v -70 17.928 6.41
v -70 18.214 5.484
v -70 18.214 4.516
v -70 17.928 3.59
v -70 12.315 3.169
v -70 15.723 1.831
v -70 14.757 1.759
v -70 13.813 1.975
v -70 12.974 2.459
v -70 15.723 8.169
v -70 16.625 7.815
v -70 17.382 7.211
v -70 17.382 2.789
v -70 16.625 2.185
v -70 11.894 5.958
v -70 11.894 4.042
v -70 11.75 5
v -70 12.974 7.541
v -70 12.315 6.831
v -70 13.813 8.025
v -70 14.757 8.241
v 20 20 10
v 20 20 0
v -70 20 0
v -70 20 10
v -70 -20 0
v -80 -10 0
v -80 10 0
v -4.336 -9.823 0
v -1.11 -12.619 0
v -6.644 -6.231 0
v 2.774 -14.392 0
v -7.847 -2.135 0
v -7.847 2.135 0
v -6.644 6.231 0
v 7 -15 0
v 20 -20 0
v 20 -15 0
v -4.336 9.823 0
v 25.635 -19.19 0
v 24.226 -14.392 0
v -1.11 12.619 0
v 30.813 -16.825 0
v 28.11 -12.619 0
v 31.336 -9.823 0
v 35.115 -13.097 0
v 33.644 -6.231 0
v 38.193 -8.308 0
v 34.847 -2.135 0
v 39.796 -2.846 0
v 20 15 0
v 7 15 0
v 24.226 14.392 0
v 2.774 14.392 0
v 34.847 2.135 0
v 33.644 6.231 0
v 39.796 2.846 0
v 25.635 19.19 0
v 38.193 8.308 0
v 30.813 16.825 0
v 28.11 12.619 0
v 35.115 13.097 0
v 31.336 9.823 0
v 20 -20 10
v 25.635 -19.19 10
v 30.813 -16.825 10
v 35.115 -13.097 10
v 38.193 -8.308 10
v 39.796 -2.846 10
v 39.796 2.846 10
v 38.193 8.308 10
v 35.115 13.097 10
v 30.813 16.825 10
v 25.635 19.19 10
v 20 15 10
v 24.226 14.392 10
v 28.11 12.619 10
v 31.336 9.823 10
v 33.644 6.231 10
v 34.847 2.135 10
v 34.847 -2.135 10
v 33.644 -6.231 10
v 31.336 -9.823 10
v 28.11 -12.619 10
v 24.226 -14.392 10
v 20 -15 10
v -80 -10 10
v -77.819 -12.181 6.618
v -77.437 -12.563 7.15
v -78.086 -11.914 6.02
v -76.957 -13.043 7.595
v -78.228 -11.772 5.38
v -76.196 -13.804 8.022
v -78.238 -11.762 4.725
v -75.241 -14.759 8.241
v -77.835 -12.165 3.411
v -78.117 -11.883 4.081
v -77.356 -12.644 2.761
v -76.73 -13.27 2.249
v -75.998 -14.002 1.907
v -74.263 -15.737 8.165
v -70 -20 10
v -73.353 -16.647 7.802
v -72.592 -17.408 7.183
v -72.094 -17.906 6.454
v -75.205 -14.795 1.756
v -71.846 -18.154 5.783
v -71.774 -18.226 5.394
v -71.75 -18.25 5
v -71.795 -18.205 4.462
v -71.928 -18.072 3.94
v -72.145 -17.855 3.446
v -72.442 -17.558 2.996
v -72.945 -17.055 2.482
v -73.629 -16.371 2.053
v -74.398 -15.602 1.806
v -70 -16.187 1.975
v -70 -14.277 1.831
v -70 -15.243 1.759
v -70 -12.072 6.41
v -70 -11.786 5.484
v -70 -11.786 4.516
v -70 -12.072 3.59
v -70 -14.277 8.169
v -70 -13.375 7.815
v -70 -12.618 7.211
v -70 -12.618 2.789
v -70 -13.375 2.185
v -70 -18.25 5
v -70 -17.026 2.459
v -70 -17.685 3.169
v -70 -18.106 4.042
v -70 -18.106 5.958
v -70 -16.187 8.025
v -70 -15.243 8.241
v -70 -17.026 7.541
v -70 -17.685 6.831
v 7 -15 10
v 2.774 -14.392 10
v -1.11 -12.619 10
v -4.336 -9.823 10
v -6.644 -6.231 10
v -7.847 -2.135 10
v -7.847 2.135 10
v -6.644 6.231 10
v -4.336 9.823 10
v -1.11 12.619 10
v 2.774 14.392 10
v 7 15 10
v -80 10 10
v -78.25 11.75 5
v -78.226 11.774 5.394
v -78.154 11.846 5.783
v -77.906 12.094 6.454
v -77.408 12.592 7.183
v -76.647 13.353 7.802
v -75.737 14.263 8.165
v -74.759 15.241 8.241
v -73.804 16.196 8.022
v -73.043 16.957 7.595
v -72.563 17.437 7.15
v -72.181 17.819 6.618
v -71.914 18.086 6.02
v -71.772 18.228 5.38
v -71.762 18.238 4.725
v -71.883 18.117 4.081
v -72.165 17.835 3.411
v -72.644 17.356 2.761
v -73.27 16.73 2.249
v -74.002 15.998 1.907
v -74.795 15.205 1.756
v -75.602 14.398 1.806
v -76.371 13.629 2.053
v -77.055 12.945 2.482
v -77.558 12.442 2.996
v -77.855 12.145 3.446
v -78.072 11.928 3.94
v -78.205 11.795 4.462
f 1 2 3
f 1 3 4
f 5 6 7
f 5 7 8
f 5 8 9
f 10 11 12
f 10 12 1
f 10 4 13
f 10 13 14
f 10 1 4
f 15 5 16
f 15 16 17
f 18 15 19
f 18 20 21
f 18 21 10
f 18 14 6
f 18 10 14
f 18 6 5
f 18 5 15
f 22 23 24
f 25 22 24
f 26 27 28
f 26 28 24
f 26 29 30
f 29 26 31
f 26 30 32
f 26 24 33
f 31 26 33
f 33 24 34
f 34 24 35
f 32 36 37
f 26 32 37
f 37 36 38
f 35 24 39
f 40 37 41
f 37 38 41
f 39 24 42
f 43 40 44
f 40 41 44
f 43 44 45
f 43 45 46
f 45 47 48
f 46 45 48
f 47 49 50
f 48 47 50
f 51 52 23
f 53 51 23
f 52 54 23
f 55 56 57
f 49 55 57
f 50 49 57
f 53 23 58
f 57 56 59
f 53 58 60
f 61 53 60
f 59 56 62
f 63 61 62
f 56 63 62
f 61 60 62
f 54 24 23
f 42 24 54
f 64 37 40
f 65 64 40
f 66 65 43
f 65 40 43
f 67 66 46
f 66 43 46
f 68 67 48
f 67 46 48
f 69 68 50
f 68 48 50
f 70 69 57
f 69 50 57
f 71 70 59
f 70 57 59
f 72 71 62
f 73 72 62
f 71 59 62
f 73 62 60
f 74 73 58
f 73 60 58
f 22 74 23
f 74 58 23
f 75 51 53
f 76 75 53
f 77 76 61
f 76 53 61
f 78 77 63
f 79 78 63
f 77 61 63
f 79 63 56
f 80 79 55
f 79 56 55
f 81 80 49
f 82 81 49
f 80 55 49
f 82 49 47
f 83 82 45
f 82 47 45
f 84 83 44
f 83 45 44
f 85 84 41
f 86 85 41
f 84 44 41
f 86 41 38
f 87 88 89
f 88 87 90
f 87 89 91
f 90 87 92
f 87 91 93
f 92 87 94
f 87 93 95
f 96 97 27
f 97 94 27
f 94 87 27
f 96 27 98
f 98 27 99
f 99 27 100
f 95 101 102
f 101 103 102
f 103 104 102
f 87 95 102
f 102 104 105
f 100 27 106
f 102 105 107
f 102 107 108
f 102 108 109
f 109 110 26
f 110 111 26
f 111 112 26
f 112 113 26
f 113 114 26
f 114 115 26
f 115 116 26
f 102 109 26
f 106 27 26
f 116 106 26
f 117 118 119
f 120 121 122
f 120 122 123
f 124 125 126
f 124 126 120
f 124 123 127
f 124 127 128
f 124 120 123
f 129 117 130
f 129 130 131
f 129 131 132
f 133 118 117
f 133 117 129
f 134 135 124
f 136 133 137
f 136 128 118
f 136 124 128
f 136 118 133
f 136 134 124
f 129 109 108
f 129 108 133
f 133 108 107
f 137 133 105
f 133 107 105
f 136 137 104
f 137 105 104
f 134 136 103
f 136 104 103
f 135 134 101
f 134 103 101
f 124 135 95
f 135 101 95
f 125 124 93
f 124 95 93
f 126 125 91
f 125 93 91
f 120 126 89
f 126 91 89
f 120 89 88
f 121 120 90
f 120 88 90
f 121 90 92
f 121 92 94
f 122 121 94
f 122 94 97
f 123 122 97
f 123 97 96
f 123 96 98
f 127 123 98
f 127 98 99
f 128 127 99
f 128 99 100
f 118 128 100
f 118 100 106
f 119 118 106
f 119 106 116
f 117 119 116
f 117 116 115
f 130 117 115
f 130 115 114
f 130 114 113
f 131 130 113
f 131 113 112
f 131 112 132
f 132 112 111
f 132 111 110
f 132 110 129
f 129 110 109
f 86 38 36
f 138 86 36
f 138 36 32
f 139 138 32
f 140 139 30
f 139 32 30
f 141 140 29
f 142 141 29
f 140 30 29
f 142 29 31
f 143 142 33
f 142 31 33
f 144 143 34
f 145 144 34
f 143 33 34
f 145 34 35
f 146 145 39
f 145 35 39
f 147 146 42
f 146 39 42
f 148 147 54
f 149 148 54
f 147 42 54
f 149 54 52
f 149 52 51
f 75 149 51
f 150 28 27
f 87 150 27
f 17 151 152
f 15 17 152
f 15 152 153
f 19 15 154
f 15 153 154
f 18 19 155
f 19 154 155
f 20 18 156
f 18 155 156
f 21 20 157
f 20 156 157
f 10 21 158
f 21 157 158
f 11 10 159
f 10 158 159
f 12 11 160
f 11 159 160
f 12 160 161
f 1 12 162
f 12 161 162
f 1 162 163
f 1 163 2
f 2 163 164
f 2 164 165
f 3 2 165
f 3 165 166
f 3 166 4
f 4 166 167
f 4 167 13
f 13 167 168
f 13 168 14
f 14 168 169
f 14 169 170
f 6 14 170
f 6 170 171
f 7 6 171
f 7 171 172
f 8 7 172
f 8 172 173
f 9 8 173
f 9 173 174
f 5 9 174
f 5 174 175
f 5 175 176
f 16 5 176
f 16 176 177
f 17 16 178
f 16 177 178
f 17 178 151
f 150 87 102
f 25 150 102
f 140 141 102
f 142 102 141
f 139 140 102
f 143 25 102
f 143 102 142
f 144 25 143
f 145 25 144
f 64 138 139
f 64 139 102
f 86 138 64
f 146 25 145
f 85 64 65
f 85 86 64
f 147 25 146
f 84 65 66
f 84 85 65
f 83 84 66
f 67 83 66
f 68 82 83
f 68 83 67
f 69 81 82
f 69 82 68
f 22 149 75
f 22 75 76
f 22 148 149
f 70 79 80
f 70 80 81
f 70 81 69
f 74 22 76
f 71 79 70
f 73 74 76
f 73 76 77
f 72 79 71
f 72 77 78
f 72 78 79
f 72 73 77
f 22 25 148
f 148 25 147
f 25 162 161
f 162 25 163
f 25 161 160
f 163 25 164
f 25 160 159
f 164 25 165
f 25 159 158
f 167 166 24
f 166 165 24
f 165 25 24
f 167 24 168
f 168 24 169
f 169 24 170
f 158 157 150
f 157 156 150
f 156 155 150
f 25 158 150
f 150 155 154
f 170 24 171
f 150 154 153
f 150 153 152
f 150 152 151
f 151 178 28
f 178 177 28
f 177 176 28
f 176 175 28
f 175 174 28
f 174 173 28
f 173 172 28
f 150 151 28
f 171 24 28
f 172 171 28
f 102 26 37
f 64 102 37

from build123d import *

# Parameters (mm, degrees)
F1_DEPTH    = 10
F2_R        = 3.25
F3_DEPTH    = 10
F4_T1_DEPTH = 61.4336597593


# Not quite as in the source:
# - a fillet or chamfer that OpenCascade refuses, or shapes differently, is made with other operations: its cross-section is extruded or revolved along the edge and cut away or added


with BuildPart() as f1:
    # F0 (on Top) → F1 (new body)
    with BuildSketch(Plane.XY):
        with BuildLine():
            Line((20, 20), (-80, 20))
            Line((-80, 20), (-80, -20))
            Line((-80, -20), (20, -20))
            ThreePointArc((20, -20), (40, 0), (20, 20))
        make_face()
        with BuildLine():
            ThreePointArc((20, 15), (35, 0), (20, -15))
            Line((20, -15), (7, -15))
            ThreePointArc((7, -15), (-8, 0), (7, 15))
            Line((7, 15), (20, 15))
        make_face(mode=Mode.SUBTRACT)
    extrude(amount=F1_DEPTH)

    # F2 (on face) → F3 (cut)
    with BuildSketch(Plane(origin=(-80, 0, 0), x_dir=(0, -1, 0), z_dir=(-1, 0, 0))):
        with Locations((-15, 5)):
            Circle(F2_R)
        with Locations((15, 5)):
            Circle(F2_R)
    extrude(amount=-F3_DEPTH, mode=Mode.SUBTRACT)

    # F4: chamfer of 10 on 2 edges, made by hand

    # F4_s2 → F4_t1 (cut)
    with BuildSketch(Plane.XY.offset(-25.7168298797)):
        Polygon((-70, 20), (-80, 10), (-80, 20), align=None)
        Polygon((-80, -10), (-70, -20), (-80, -20), align=None)
    extrude(amount=F4_T1_DEPTH, mode=Mode.SUBTRACT)


solid = f1.part
